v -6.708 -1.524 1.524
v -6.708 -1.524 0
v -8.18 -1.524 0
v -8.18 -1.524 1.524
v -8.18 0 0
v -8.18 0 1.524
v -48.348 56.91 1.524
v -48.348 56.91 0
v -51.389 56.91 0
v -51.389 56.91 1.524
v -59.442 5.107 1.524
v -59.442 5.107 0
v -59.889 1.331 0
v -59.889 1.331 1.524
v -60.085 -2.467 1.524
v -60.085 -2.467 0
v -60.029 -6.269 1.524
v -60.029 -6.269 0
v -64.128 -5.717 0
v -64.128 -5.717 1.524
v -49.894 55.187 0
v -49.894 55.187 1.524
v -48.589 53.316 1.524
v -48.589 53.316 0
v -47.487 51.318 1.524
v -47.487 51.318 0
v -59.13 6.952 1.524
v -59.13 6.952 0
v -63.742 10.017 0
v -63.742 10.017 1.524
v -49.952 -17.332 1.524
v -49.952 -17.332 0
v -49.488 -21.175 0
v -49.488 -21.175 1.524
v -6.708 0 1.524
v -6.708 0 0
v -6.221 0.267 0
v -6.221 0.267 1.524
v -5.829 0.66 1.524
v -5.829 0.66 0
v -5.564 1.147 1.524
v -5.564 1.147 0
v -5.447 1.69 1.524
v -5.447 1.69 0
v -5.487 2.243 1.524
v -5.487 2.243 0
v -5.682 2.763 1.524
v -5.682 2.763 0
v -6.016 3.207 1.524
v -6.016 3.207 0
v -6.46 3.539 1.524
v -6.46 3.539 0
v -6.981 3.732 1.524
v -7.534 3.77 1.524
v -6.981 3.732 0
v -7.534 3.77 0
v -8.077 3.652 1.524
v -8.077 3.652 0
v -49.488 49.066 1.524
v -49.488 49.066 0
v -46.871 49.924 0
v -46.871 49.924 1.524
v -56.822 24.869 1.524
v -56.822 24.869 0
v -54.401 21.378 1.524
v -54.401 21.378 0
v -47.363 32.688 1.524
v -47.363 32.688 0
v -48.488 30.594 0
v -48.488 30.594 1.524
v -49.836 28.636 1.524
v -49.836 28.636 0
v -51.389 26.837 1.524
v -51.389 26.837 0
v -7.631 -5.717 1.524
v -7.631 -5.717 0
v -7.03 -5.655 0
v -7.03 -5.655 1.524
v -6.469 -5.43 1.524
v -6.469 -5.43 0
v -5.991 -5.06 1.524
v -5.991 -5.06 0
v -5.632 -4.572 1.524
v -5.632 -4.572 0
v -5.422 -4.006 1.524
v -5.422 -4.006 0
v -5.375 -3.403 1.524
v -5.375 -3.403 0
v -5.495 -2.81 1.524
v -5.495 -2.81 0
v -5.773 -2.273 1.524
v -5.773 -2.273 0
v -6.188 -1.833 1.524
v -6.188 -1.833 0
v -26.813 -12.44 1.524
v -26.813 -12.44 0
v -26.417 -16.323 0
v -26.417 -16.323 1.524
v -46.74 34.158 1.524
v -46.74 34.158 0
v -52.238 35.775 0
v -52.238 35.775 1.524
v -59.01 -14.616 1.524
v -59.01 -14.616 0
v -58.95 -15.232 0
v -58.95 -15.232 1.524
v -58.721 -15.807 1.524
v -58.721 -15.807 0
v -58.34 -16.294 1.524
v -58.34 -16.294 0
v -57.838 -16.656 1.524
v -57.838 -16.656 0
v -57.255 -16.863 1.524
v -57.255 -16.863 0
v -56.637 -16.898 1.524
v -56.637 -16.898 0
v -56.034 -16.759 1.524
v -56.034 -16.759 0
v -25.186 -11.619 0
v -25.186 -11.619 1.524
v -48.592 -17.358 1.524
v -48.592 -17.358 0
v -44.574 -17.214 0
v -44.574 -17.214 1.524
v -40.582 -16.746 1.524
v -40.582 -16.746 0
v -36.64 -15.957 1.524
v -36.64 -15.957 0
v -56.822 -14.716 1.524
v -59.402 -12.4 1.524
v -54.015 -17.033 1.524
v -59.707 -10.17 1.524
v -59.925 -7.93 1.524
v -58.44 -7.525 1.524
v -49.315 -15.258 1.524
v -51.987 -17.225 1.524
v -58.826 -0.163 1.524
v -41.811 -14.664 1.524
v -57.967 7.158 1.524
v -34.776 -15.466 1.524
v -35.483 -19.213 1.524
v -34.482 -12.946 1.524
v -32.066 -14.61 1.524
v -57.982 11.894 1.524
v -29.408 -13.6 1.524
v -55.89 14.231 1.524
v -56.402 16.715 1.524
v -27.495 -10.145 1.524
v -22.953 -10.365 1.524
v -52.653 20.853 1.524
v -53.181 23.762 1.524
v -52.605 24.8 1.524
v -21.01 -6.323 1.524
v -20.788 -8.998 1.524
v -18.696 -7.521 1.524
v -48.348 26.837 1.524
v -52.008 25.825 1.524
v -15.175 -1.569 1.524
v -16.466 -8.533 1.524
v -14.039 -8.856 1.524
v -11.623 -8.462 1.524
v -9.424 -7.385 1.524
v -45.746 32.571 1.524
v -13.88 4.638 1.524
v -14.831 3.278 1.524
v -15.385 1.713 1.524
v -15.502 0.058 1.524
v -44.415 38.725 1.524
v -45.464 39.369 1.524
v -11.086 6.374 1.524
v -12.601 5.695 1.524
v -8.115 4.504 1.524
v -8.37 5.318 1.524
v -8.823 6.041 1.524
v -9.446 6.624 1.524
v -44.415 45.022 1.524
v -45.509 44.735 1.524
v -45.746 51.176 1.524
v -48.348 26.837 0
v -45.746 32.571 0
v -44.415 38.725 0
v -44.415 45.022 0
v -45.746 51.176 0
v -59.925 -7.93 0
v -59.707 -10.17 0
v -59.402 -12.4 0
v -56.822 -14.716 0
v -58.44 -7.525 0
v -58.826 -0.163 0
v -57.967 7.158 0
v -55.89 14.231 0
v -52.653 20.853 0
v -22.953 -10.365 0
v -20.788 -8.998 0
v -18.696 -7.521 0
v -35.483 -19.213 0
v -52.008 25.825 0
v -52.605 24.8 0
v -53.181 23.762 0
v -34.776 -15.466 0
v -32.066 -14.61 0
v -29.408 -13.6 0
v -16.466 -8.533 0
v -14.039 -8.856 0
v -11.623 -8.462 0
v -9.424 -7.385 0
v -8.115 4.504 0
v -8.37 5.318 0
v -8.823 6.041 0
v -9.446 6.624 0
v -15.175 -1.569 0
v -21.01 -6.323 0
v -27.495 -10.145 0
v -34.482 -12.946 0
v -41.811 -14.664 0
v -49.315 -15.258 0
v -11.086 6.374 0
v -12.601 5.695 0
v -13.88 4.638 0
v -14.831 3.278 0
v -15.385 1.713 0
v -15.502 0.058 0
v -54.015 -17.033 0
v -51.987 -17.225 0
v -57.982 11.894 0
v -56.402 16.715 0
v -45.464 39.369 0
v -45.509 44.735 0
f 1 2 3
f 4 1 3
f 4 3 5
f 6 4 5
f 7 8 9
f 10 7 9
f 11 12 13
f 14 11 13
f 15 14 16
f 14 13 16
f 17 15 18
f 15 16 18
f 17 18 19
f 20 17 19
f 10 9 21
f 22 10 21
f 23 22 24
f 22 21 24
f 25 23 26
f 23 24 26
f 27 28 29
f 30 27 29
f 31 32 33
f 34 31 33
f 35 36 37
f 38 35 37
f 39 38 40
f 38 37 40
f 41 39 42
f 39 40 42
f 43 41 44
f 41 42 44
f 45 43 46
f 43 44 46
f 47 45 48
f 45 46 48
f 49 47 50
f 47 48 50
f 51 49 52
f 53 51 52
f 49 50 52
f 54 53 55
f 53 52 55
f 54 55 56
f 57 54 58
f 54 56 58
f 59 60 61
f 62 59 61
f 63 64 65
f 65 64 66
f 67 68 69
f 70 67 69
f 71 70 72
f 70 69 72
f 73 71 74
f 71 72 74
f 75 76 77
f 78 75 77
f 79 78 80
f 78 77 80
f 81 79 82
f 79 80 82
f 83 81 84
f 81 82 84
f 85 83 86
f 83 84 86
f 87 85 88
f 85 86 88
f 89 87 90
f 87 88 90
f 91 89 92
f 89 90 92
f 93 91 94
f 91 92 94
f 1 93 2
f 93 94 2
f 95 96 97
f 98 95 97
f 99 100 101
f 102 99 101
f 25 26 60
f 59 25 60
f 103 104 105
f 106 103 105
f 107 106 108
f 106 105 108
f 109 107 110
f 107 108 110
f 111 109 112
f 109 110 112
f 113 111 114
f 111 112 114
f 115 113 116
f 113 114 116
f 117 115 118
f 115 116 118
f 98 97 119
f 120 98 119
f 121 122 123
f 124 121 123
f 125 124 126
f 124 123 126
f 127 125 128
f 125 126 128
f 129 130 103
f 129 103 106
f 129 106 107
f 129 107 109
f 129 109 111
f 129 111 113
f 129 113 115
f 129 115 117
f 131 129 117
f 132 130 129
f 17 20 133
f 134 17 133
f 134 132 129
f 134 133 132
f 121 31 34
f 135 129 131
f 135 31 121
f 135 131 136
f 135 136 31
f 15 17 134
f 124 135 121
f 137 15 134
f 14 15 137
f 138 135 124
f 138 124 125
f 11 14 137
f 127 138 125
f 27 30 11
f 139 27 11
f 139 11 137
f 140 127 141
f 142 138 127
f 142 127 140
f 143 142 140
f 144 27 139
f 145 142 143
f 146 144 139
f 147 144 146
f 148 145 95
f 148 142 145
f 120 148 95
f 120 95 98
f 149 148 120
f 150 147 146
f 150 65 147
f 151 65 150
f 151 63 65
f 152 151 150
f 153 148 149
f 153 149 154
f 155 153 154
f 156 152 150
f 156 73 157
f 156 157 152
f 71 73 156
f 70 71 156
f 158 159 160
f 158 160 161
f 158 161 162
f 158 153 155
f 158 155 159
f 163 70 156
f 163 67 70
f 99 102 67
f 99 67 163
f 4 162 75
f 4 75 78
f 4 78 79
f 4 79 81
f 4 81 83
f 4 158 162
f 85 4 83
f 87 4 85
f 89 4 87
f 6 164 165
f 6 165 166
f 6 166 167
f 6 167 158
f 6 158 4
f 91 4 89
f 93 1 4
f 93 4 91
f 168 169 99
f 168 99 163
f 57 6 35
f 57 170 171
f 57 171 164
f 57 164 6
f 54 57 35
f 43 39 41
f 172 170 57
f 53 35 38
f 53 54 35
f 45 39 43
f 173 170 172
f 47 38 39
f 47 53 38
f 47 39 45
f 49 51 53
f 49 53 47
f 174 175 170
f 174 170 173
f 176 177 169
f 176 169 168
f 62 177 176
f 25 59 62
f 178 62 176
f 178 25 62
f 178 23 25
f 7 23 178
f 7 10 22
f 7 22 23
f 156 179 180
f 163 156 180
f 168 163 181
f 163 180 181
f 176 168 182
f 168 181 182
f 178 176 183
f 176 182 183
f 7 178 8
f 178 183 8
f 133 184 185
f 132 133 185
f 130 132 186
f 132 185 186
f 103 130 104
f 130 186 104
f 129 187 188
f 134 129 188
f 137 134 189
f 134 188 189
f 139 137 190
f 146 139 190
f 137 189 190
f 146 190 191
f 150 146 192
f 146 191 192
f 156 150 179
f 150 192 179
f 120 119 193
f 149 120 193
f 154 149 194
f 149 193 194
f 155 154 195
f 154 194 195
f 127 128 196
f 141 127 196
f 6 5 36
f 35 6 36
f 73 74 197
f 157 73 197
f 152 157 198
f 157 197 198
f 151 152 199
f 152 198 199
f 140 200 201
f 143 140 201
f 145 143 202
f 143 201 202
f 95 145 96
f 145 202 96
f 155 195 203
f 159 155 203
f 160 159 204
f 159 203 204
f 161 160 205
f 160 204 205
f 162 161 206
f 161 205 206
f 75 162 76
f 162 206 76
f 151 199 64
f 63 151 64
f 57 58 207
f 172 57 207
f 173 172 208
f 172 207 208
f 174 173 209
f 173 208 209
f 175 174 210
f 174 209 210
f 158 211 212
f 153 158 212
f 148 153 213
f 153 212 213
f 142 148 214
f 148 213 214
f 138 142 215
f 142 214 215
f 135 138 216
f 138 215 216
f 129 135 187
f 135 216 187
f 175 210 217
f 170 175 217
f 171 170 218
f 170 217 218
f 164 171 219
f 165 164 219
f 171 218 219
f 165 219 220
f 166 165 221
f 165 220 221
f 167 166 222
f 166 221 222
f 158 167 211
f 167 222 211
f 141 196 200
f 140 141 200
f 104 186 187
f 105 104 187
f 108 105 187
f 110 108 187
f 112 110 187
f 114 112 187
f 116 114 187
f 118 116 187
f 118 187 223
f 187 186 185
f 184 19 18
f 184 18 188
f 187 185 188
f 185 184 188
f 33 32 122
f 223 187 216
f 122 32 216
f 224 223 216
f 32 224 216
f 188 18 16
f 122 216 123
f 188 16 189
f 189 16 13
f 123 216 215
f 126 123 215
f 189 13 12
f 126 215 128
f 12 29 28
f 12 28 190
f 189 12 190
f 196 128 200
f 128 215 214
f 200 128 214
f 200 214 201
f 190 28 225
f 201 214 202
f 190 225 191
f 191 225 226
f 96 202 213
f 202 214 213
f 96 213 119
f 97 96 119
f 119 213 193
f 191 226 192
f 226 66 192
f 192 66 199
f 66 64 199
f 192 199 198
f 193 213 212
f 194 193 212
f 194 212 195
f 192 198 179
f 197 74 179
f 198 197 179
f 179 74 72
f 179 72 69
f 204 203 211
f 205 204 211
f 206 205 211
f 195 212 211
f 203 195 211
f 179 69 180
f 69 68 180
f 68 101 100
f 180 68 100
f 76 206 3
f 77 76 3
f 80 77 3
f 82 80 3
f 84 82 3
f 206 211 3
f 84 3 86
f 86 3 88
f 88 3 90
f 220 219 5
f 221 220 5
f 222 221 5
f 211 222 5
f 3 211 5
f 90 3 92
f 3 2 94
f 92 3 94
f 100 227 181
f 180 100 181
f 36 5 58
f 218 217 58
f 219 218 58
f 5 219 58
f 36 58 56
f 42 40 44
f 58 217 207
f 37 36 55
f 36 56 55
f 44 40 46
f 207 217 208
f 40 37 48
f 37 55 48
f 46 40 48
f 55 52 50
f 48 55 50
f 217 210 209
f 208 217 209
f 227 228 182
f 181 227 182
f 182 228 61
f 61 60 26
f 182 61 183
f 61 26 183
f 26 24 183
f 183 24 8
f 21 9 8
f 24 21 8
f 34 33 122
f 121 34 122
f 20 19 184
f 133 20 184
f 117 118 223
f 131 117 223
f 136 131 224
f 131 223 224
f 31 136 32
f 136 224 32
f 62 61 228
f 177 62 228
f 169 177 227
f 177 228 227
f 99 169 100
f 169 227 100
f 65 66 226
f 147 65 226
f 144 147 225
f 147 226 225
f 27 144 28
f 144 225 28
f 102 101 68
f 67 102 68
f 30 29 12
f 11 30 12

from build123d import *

# Parameters (mm, degrees)
BOSS_EXTRUDE1_DEPTH = 1.524


with BuildPart() as part:
    # Sketch1 → Boss-Extrude1 (new body)
    with BuildSketch(Plane.XY):
        with BuildLine():
            Line((-6.707532294, -1.524), (-8.180261599, -1.524))
            Line((-8.180261599, -1.524), (-8.180261599, 0))
            Line((-8.180261599, 0), (-6.707532294, 0))
            ThreePointArc((-6.707532294, 0), (-5.566232372, 2.510291461), (-8.076523834, 3.651591383))
            ThreePointArc((-8.076523834, 3.651591383), (-8.369654544, 5.318155721), (-9.445515373, 6.624251346))
            ThreePointArc((-9.445515373, 6.624251346), (-14.401020029, 3.989835798), (-15.174514112, -1.568840176))
            ThreePointArc((-15.174514112, -1.568840176), (-34.4819371, -12.946344269), (-56.822290696, -14.716311235))
            ThreePointArc((-56.822290696, -14.716311235), (-57.967480091, 7.157863233), (-48.348408829, 26.836898663))
            ThreePointArc((-48.348408829, 26.836898663), (-44.246968405, 41.873579483), (-48.348408829, 56.910260303))
            Line((-48.348408829, 56.910260303), (-51.389474112, 56.910260303))
            ThreePointArc((-51.389474112, 56.910260303), (-49.216811045, 54.268914149), (-47.487026065, 51.318487362))
            Line((-47.487026065, 51.318487362), (-49.488434682, 49.065882941))
            Line((-49.488434682, 49.065882941), (-46.871051317, 49.924357948))
            ThreePointArc((-46.871051317, 49.924357948), (-45.319923788, 42.05338237), (-46.740158296, 34.157738817))
            Line((-46.740158296, 34.157738817), (-52.238150108, 35.775293633))
            Line((-52.238150108, 35.775293633), (-47.363457894, 32.688041845))
            ThreePointArc((-47.363457894, 32.688041845), (-49.134990292, 29.596317231), (-51.389474112, 26.836898663))
            ThreePointArc((-51.389474112, 26.836898663), (-52.30892636, 25.313565237), (-53.180617863, 23.762407254))
            Line((-53.180617863, 23.762407254), (-56.822290696, 24.868655134))
            Line((-56.822290696, 24.868655134), (-54.401149248, 21.377722623))
            ThreePointArc((-54.401149248, 21.377722623), (-57.245514929, 14.322290898), (-59.129790068, 6.952145706))
            Line((-59.129790068, 6.952145706), (-63.741523441, 10.016836401))
            Line((-63.741523441, 10.016836401), (-59.441762763, 5.107182625))
            ThreePointArc((-59.441762763, 5.107182625), (-60.018868287, -0.566291047), (-60.028931863, -6.26903188))
            Line((-60.028931863, -6.26903188), (-64.127892645, -5.71704549))
            Line((-64.127892645, -5.71704549), (-59.924854983, -7.930246527))
            ThreePointArc((-59.924854983, -7.930246527), (-59.56576898, -11.286860212), (-59.00955991, -14.616489269))
            ThreePointArc((-59.00955991, -14.616489269), (-58.101840622, -16.493067556), (-56.034305753, -16.759150133))
            ThreePointArc((-56.034305753, -16.759150133), (-53.001957218, -17.139391155), (-49.951949985, -17.332203884))
            Line((-49.951949985, -17.332203884), (-49.488434682, -21.174519893))
            Line((-49.488434682, -21.174519893), (-48.591597193, -17.35752957))
            ThreePointArc((-48.591597193, -17.35752957), (-42.573321797, -17.020849086), (-36.640297554, -15.956792779))
            Line((-36.640297554, -15.956792779), (-35.482848207, -19.212777207))
            Line((-35.482848207, -19.212777207), (-34.776442064, -15.465610409))
            ThreePointArc((-34.776442064, -15.465610409), (-30.729531902, -14.124143433), (-26.812740931, -12.440170747))
            Line((-26.812740931, -12.440170747), (-26.416692929, -16.322506345))
            Line((-26.416692929, -16.322506345), (-25.185933177, -11.619136315))
            ThreePointArc((-25.185933177, -11.619136315), (-21.861410327, -9.695823756), (-18.695636823, -7.521091244))
            ThreePointArc((-18.695636823, -7.521091244), (-12.816455315, -8.747608772), (-7.631399226, -5.71704549))
            ThreePointArc((-7.631399226, -5.71704549), (-5.42183259, -4.005584271), (-6.707532294, -1.524))
        make_face()
    extrude(amount=BOSS_EXTRUDE1_DEPTH)


solid = part.part
